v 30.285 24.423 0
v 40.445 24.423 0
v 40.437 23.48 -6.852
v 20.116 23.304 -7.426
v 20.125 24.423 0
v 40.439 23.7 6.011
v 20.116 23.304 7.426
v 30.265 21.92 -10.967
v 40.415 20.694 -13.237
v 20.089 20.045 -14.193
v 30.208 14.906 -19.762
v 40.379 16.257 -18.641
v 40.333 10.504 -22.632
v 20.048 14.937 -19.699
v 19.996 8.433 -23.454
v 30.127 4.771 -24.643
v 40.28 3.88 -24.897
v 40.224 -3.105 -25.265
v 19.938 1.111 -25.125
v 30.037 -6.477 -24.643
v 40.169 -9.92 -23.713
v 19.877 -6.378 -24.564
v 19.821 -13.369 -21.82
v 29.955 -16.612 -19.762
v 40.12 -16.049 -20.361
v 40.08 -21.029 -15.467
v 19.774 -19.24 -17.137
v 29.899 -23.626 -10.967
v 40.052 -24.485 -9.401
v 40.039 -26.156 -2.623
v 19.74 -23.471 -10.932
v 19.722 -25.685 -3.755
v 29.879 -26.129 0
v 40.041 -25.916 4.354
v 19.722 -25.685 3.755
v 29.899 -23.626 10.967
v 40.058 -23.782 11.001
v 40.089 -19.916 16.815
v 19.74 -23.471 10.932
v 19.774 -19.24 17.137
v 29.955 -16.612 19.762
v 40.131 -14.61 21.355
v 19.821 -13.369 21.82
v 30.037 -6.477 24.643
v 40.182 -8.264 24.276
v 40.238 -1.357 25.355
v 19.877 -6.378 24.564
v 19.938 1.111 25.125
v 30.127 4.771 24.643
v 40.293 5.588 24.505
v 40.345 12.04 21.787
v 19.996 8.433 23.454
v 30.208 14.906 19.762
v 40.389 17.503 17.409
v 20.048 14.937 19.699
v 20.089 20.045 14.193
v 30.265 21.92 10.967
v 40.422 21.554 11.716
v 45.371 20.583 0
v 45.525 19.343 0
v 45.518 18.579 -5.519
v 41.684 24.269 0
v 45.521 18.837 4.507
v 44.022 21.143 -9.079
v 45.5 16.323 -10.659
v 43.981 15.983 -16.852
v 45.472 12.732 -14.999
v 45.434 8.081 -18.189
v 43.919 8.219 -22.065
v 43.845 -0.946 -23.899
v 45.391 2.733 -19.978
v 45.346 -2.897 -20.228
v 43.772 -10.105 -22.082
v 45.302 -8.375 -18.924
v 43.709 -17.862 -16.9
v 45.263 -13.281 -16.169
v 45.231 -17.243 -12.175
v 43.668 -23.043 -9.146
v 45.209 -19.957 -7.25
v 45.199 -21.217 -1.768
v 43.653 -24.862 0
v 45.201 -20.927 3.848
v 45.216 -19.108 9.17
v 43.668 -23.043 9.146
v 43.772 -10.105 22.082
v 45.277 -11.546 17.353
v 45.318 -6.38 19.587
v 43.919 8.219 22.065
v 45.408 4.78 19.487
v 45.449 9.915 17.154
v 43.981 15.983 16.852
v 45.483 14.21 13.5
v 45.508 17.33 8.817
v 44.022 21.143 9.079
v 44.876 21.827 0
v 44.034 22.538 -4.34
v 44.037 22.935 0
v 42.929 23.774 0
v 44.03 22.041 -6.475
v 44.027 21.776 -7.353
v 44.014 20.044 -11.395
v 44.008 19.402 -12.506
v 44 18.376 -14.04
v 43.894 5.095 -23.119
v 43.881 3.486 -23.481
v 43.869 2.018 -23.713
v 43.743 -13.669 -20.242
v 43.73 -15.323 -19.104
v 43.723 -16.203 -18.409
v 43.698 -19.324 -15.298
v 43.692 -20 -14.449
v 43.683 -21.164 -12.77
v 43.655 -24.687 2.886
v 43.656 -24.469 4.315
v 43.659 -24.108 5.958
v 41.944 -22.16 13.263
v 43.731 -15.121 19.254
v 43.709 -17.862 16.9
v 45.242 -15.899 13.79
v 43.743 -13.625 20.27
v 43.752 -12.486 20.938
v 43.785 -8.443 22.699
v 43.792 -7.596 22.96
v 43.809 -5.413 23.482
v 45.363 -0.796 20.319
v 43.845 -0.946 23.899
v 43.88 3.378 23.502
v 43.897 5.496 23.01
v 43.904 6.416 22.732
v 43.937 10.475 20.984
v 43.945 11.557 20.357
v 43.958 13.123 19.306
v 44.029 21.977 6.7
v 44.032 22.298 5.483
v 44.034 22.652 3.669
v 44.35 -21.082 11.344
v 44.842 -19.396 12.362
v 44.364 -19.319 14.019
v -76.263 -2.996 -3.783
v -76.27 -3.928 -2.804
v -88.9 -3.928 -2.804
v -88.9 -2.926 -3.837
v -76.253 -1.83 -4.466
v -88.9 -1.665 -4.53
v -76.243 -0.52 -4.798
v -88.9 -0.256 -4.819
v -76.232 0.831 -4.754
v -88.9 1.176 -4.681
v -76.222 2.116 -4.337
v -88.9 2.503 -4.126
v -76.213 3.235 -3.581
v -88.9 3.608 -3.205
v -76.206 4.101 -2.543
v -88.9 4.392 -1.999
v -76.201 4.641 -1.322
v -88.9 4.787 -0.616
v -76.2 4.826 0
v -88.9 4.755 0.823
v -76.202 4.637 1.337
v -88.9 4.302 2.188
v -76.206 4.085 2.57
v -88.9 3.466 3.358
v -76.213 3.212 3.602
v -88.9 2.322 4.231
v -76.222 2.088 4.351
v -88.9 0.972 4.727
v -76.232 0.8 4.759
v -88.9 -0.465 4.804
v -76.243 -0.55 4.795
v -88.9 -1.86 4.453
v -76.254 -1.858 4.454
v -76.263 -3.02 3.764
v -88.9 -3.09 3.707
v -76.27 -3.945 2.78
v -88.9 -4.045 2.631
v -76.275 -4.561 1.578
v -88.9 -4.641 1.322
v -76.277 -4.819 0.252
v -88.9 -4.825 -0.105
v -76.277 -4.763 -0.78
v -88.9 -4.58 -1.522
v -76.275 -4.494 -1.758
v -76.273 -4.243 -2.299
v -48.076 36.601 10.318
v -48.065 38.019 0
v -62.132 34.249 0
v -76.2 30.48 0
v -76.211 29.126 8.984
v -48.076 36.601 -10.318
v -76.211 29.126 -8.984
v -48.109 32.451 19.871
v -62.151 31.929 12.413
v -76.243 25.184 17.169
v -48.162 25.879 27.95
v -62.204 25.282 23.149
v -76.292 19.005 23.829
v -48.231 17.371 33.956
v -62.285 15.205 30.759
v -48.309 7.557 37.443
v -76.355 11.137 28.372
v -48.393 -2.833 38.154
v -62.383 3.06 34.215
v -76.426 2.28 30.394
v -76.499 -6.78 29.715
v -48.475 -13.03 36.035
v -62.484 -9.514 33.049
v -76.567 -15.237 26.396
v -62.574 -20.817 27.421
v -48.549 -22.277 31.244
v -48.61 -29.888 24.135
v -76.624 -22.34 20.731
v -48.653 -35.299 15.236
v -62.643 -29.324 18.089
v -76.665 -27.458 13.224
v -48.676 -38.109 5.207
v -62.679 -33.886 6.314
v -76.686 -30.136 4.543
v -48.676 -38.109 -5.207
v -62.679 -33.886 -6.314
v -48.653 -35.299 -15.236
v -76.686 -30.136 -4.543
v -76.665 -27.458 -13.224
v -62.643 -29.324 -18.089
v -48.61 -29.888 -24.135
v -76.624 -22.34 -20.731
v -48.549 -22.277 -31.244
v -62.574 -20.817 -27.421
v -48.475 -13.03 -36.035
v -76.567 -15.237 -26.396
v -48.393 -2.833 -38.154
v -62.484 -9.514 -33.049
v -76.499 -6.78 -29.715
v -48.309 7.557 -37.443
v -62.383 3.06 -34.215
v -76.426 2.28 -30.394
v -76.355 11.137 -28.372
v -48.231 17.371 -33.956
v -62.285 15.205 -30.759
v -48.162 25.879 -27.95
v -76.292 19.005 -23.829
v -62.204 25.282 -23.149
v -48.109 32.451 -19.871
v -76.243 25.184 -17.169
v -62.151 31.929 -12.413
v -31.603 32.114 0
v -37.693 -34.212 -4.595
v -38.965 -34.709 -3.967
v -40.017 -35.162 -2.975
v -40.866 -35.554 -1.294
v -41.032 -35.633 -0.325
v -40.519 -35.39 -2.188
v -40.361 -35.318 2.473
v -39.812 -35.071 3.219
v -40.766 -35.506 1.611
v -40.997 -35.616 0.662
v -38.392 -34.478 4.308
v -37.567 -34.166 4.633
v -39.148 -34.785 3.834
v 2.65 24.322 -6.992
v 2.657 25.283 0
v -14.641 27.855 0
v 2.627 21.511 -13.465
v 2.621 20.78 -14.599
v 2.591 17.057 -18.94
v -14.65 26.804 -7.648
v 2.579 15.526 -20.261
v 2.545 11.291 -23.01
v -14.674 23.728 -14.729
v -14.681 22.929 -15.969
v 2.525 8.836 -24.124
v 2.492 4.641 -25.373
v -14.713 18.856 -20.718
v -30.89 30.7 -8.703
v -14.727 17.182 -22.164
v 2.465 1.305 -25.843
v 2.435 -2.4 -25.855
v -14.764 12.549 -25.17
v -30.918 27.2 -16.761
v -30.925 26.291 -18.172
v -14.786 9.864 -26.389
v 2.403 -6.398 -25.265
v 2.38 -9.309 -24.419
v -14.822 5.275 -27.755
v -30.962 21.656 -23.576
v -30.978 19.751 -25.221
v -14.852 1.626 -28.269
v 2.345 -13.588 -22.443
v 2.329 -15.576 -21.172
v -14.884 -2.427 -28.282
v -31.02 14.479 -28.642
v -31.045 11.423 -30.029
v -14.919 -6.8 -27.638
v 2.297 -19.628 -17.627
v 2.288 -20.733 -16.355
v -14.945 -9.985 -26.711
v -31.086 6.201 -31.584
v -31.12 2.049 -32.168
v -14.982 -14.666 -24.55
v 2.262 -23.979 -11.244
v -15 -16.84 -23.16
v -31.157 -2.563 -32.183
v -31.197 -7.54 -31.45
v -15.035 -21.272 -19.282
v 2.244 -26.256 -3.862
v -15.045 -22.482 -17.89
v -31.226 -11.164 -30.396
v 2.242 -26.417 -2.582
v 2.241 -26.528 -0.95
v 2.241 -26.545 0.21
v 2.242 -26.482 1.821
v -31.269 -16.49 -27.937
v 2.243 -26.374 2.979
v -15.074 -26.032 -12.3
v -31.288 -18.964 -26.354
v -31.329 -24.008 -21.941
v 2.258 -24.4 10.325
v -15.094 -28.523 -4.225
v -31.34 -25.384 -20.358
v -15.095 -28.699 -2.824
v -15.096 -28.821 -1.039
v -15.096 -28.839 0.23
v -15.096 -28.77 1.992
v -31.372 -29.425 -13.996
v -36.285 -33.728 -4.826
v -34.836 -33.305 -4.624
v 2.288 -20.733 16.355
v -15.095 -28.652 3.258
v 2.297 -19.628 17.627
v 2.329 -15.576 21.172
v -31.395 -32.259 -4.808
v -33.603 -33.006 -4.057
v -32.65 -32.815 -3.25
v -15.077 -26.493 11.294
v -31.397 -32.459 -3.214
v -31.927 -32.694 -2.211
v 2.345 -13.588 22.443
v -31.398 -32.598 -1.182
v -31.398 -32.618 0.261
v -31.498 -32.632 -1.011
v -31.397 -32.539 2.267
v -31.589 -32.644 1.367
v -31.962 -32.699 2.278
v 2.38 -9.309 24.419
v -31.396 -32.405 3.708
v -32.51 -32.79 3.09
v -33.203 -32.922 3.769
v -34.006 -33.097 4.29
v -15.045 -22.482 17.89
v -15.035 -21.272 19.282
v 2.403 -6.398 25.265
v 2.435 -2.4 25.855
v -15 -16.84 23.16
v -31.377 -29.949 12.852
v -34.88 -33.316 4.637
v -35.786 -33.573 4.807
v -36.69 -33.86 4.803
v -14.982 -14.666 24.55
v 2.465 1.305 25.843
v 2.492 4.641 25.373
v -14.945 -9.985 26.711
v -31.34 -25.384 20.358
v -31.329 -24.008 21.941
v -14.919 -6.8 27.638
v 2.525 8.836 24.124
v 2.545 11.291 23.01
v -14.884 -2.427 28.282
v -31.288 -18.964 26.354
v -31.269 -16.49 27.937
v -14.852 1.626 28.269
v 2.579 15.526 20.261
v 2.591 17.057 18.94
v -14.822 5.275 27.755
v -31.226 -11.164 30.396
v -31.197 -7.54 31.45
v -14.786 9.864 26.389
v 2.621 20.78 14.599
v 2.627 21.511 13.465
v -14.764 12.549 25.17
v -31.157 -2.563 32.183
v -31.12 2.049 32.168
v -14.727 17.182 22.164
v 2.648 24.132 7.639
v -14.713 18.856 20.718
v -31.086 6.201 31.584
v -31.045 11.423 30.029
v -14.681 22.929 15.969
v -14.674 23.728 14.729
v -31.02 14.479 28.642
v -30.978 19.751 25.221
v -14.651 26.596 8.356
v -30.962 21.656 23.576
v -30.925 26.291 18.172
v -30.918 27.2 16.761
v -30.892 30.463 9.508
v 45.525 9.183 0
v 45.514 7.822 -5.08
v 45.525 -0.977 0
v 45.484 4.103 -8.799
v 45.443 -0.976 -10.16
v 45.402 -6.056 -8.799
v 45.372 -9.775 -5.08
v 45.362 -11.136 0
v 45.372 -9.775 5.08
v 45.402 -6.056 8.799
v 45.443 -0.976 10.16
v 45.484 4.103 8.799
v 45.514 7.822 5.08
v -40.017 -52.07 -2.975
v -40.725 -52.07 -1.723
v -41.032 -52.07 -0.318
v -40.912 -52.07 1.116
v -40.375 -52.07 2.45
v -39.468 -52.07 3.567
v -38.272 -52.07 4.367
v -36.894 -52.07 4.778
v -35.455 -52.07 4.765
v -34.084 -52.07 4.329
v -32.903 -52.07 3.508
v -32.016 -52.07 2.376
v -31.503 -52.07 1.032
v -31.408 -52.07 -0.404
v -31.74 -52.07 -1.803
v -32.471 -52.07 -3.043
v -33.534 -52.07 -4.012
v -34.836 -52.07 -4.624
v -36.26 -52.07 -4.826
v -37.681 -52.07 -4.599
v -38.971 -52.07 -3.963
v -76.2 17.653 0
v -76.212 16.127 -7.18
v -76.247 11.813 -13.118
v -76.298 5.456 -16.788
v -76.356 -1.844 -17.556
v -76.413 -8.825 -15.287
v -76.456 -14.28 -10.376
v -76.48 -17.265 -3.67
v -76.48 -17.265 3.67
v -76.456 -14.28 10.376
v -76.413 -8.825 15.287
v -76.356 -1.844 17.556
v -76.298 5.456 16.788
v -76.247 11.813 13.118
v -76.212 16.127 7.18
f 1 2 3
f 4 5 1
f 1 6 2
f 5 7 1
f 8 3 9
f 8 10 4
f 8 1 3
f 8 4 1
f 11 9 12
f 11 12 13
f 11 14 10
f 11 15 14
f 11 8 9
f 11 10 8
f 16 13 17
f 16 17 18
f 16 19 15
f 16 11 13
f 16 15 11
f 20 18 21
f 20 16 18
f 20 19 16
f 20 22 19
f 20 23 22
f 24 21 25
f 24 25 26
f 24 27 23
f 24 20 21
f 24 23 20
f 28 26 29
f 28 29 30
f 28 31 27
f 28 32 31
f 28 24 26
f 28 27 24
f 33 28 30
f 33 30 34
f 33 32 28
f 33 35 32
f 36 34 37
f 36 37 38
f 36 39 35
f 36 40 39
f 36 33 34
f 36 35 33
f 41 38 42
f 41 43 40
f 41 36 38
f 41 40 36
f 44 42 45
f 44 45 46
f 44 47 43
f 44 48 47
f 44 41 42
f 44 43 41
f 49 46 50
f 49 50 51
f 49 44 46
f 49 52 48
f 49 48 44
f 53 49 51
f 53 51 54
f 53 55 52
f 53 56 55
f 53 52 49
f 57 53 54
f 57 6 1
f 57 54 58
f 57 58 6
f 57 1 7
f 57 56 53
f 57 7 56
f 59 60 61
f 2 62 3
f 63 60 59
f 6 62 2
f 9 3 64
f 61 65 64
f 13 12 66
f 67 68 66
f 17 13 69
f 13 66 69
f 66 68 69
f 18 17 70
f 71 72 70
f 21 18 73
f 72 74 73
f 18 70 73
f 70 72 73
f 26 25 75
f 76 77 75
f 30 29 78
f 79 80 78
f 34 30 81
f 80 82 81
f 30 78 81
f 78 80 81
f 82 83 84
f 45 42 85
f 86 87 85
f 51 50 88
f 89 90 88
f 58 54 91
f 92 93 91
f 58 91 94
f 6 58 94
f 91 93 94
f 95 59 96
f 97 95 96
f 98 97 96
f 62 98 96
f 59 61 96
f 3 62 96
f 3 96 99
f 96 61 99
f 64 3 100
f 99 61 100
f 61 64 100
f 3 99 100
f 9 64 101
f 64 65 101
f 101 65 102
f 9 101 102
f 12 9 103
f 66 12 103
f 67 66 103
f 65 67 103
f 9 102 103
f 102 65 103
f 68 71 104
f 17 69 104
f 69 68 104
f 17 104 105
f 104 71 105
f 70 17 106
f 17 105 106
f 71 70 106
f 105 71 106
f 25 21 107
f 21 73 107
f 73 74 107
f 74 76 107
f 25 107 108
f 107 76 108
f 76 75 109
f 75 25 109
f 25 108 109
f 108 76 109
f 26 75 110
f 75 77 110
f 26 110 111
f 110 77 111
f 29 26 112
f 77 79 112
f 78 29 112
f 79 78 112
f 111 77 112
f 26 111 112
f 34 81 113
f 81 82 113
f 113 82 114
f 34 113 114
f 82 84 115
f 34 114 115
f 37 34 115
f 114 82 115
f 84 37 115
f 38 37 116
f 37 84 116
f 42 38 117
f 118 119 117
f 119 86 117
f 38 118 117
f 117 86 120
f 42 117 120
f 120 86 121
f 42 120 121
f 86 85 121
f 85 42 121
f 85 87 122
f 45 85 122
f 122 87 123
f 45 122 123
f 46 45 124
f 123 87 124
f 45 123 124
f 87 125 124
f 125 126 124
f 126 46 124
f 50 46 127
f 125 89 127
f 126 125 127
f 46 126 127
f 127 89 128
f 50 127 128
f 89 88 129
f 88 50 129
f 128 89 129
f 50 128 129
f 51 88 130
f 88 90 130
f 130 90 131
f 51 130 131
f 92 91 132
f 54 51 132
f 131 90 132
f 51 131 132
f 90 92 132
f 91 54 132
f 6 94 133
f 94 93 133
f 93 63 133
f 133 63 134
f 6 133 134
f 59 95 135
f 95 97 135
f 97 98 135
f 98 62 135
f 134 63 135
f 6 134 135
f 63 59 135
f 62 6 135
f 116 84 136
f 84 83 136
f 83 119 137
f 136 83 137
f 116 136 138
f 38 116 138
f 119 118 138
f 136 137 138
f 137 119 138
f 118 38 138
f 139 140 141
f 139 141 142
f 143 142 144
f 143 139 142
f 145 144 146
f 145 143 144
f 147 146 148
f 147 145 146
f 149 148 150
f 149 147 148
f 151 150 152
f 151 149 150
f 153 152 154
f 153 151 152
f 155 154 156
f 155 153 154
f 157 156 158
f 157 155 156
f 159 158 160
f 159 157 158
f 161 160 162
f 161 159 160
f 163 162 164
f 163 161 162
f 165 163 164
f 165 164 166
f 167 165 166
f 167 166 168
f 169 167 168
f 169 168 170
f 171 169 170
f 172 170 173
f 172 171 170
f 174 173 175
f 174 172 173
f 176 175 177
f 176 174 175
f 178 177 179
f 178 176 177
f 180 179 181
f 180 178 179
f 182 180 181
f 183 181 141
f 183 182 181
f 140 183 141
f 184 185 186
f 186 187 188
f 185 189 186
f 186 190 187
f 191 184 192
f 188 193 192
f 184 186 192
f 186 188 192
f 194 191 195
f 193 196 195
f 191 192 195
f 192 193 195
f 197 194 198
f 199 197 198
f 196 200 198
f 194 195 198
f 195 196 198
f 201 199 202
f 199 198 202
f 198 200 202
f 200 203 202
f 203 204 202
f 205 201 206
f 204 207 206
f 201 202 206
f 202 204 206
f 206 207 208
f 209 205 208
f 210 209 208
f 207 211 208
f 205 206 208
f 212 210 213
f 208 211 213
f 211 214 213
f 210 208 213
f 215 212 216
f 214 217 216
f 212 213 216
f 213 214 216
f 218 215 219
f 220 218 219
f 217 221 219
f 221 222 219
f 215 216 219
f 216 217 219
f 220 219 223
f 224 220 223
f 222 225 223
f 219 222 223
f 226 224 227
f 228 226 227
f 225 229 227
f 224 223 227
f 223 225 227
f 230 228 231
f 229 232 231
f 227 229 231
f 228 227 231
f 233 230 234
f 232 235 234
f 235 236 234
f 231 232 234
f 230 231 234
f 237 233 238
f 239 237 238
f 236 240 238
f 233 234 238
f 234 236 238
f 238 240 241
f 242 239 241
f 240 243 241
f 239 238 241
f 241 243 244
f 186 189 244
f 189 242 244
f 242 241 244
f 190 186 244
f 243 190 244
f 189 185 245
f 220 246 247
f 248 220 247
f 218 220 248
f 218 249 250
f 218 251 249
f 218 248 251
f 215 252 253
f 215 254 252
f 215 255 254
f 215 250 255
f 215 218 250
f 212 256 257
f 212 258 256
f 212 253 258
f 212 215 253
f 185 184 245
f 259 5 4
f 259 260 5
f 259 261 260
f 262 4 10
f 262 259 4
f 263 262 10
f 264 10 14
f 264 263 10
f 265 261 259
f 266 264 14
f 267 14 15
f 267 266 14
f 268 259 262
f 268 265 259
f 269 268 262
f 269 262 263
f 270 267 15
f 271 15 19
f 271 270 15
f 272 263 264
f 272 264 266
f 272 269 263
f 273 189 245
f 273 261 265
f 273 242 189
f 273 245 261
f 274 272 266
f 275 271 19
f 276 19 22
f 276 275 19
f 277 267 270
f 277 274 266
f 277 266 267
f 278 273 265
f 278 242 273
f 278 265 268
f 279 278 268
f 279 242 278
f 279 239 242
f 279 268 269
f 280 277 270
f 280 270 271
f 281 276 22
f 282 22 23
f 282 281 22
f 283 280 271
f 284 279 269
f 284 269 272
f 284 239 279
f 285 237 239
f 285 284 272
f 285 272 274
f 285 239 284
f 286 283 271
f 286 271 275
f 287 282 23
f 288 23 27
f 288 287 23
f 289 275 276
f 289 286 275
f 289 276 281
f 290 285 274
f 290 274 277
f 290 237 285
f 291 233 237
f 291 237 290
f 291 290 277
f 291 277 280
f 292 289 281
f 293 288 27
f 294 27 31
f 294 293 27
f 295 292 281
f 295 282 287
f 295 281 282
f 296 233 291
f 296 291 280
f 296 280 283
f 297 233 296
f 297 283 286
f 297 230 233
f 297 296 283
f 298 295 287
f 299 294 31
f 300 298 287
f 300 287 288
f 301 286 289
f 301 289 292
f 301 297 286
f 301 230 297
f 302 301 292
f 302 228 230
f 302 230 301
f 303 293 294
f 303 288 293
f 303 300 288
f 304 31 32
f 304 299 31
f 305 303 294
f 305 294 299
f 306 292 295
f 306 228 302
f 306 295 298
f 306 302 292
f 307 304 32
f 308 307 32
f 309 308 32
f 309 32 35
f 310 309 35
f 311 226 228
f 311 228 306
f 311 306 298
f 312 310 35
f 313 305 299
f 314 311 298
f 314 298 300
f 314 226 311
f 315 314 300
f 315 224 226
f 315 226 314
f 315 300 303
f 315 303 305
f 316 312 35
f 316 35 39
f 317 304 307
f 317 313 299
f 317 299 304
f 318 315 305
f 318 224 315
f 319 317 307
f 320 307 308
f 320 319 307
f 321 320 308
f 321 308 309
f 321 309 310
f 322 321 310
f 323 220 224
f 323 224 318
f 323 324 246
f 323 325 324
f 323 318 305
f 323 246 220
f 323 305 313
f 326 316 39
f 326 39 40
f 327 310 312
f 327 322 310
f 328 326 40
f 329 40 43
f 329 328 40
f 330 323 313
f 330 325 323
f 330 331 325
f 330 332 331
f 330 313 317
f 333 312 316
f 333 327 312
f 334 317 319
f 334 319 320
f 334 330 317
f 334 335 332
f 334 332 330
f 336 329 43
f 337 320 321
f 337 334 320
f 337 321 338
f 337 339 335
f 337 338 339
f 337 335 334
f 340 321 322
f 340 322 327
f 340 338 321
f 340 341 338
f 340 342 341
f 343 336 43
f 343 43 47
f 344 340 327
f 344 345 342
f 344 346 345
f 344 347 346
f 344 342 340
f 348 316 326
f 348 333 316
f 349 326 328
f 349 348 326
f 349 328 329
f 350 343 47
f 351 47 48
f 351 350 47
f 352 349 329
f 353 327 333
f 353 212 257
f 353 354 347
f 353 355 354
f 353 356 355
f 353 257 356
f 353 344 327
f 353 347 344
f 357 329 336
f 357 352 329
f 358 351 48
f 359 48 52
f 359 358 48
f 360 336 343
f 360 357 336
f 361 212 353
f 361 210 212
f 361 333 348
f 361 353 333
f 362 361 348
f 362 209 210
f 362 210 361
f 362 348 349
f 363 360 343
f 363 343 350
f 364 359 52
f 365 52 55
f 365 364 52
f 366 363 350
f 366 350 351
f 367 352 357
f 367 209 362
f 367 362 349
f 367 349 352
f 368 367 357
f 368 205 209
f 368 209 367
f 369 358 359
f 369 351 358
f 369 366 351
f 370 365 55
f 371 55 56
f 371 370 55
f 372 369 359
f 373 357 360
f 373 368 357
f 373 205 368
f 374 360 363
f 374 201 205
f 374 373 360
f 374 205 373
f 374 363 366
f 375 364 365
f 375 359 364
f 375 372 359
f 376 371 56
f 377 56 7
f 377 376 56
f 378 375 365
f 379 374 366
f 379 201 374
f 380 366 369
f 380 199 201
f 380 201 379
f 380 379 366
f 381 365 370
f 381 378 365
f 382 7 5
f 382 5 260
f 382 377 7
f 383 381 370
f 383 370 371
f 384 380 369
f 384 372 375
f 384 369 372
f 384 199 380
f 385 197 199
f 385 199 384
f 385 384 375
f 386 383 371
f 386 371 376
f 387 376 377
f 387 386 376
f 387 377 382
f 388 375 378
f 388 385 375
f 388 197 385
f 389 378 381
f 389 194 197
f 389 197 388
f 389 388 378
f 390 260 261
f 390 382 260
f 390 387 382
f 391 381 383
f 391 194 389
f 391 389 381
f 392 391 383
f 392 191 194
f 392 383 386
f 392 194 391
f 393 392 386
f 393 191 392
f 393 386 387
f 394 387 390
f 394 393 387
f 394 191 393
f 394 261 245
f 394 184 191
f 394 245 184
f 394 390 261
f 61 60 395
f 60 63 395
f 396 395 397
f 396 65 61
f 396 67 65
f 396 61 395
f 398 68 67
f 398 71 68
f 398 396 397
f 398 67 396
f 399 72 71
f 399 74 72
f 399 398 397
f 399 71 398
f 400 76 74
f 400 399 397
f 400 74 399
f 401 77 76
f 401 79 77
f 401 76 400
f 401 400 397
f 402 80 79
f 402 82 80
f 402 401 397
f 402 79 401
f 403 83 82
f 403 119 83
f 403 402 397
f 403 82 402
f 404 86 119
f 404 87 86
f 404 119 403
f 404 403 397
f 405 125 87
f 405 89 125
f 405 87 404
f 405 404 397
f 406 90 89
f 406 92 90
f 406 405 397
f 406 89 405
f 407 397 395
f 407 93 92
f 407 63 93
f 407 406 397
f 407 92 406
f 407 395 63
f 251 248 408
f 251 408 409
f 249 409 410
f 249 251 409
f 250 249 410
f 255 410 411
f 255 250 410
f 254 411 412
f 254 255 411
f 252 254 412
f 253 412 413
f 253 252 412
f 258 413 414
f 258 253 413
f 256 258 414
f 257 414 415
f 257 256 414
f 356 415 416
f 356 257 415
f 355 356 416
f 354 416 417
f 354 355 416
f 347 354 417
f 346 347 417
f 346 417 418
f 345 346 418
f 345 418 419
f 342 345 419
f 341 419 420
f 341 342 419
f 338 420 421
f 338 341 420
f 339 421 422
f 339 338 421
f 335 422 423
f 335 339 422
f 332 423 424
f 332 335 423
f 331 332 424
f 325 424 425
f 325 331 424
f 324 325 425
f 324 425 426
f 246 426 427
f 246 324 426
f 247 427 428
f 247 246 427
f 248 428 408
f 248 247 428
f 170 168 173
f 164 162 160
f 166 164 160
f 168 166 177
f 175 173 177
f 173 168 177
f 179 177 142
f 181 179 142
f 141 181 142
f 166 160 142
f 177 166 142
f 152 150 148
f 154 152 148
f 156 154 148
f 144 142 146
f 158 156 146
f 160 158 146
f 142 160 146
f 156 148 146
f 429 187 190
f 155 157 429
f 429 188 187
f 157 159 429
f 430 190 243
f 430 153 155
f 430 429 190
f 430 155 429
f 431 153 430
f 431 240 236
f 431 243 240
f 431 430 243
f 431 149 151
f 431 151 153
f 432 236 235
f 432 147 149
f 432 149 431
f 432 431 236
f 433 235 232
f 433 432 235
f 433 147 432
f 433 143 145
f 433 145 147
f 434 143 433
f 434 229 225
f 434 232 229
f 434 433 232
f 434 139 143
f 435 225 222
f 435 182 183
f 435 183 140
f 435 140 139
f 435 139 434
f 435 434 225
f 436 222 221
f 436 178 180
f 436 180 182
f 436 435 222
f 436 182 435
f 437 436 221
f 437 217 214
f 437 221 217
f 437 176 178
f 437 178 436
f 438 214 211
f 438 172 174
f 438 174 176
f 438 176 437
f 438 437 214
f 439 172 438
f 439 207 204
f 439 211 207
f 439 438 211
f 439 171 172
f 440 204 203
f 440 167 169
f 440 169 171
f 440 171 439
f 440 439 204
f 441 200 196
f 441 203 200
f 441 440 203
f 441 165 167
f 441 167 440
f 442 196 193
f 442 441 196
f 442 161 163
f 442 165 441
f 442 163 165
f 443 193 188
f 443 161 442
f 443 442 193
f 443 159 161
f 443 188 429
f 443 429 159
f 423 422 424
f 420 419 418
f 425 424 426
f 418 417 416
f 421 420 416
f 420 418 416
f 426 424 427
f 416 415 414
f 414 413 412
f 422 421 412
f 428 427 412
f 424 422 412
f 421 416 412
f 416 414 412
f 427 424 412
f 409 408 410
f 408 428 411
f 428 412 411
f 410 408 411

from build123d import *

# Parameters (mm, degrees)
FILLET2_R           = 5.08
SKETCH3_R           = 4.826
BOSS_EXTRUDE1_DEPTH = 12.7
SKETCH5_R           = 4.826
BOSS_EXTRUDE2_DEPTH = 12.7


with BuildPart() as part:
    # Sketch1 → Revolve2 (revolve)
    with BuildSketch(Plane.XY):
        with BuildLine():
            Line((45.524615385, -0.976923077), (45.524615385, 24.423076923))
            Line((45.524615385, 24.423076923), (20.124615385, 24.423076923))
            ThreePointArc((20.124615385, 24.423076923), (-14.744833443, 27.875832785), (-48.26, 38.1))
            Line((-48.26, 38.1), (-50.8, 38.1))
            Line((-50.8, 38.1), (-76.2, 38.1))
            Line((-76.2, 38.1), (-76.2, 0))
            Line((-76.2, 0), (45.524615385, -0.976923077))
        make_face()
    revolve(axis=Axis((45.524615385, -0.976923077, 0), (-0.9999677957684845, 0.008025423722058495, 0)))

    # Fillet2
    fillet2_edges = [part.edges().sort_by_distance(p)[0] for p in [
        (45.116936989, -26.37365118, 0),
    ]]
    fillet(fillet2_edges, radius=FILLET2_R)

    # Chamfer1: read off the stored shape, not the designer's step
    # Chamfer1 outline → Chamfer1 (revolve, cut)
    with BuildSketch(Plane(origin=(-0.004907846, -0.611517594, 0), x_dir=(0.008025423722058226, 0.9999677957684845, 0), z_dir=(0, 0, -1))):
        Polygon((30.479018415, -76.442160953), (30.479018415, -76.503314681), (38.098773019, -76.503314681), (38.323003358, -48.564214468), (38.323003358, -48.368371001), (38.243376135, -48.368371001), align=None)
    revolve(axis=Axis((-0.004907846, -0.611517594, 0), (0.9999677957684845, -0.008025423722058226, 0)), mode=Mode.SUBTRACT)

    # Sketch3 → Boss-Extrude1 (add, symmetric)
    with BuildSketch(Plane(origin=(-76.2, 0, 0), x_dir=(0, 0, -1), z_dir=(1, 0, 0))):
        with Locations(Location((0, 0, 0), (0, 0, 305.528030249))):
            Circle(SKETCH3_R)
    extrude(amount=BOSS_EXTRUDE1_DEPTH, both=True)

    # Sketch5 → Boss-Extrude2 (add, symmetric)
    with BuildSketch(Plane(origin=(0, -39.37, 0), x_dir=(1, 0, 0), z_dir=(0, 1, 0))):
        with Locations(Location((-36.216917905, 0, 0), (0, 0, 141.940248705))):
            Circle(SKETCH5_R)
    extrude(amount=BOSS_EXTRUDE2_DEPTH, both=True)


solid = part.part
